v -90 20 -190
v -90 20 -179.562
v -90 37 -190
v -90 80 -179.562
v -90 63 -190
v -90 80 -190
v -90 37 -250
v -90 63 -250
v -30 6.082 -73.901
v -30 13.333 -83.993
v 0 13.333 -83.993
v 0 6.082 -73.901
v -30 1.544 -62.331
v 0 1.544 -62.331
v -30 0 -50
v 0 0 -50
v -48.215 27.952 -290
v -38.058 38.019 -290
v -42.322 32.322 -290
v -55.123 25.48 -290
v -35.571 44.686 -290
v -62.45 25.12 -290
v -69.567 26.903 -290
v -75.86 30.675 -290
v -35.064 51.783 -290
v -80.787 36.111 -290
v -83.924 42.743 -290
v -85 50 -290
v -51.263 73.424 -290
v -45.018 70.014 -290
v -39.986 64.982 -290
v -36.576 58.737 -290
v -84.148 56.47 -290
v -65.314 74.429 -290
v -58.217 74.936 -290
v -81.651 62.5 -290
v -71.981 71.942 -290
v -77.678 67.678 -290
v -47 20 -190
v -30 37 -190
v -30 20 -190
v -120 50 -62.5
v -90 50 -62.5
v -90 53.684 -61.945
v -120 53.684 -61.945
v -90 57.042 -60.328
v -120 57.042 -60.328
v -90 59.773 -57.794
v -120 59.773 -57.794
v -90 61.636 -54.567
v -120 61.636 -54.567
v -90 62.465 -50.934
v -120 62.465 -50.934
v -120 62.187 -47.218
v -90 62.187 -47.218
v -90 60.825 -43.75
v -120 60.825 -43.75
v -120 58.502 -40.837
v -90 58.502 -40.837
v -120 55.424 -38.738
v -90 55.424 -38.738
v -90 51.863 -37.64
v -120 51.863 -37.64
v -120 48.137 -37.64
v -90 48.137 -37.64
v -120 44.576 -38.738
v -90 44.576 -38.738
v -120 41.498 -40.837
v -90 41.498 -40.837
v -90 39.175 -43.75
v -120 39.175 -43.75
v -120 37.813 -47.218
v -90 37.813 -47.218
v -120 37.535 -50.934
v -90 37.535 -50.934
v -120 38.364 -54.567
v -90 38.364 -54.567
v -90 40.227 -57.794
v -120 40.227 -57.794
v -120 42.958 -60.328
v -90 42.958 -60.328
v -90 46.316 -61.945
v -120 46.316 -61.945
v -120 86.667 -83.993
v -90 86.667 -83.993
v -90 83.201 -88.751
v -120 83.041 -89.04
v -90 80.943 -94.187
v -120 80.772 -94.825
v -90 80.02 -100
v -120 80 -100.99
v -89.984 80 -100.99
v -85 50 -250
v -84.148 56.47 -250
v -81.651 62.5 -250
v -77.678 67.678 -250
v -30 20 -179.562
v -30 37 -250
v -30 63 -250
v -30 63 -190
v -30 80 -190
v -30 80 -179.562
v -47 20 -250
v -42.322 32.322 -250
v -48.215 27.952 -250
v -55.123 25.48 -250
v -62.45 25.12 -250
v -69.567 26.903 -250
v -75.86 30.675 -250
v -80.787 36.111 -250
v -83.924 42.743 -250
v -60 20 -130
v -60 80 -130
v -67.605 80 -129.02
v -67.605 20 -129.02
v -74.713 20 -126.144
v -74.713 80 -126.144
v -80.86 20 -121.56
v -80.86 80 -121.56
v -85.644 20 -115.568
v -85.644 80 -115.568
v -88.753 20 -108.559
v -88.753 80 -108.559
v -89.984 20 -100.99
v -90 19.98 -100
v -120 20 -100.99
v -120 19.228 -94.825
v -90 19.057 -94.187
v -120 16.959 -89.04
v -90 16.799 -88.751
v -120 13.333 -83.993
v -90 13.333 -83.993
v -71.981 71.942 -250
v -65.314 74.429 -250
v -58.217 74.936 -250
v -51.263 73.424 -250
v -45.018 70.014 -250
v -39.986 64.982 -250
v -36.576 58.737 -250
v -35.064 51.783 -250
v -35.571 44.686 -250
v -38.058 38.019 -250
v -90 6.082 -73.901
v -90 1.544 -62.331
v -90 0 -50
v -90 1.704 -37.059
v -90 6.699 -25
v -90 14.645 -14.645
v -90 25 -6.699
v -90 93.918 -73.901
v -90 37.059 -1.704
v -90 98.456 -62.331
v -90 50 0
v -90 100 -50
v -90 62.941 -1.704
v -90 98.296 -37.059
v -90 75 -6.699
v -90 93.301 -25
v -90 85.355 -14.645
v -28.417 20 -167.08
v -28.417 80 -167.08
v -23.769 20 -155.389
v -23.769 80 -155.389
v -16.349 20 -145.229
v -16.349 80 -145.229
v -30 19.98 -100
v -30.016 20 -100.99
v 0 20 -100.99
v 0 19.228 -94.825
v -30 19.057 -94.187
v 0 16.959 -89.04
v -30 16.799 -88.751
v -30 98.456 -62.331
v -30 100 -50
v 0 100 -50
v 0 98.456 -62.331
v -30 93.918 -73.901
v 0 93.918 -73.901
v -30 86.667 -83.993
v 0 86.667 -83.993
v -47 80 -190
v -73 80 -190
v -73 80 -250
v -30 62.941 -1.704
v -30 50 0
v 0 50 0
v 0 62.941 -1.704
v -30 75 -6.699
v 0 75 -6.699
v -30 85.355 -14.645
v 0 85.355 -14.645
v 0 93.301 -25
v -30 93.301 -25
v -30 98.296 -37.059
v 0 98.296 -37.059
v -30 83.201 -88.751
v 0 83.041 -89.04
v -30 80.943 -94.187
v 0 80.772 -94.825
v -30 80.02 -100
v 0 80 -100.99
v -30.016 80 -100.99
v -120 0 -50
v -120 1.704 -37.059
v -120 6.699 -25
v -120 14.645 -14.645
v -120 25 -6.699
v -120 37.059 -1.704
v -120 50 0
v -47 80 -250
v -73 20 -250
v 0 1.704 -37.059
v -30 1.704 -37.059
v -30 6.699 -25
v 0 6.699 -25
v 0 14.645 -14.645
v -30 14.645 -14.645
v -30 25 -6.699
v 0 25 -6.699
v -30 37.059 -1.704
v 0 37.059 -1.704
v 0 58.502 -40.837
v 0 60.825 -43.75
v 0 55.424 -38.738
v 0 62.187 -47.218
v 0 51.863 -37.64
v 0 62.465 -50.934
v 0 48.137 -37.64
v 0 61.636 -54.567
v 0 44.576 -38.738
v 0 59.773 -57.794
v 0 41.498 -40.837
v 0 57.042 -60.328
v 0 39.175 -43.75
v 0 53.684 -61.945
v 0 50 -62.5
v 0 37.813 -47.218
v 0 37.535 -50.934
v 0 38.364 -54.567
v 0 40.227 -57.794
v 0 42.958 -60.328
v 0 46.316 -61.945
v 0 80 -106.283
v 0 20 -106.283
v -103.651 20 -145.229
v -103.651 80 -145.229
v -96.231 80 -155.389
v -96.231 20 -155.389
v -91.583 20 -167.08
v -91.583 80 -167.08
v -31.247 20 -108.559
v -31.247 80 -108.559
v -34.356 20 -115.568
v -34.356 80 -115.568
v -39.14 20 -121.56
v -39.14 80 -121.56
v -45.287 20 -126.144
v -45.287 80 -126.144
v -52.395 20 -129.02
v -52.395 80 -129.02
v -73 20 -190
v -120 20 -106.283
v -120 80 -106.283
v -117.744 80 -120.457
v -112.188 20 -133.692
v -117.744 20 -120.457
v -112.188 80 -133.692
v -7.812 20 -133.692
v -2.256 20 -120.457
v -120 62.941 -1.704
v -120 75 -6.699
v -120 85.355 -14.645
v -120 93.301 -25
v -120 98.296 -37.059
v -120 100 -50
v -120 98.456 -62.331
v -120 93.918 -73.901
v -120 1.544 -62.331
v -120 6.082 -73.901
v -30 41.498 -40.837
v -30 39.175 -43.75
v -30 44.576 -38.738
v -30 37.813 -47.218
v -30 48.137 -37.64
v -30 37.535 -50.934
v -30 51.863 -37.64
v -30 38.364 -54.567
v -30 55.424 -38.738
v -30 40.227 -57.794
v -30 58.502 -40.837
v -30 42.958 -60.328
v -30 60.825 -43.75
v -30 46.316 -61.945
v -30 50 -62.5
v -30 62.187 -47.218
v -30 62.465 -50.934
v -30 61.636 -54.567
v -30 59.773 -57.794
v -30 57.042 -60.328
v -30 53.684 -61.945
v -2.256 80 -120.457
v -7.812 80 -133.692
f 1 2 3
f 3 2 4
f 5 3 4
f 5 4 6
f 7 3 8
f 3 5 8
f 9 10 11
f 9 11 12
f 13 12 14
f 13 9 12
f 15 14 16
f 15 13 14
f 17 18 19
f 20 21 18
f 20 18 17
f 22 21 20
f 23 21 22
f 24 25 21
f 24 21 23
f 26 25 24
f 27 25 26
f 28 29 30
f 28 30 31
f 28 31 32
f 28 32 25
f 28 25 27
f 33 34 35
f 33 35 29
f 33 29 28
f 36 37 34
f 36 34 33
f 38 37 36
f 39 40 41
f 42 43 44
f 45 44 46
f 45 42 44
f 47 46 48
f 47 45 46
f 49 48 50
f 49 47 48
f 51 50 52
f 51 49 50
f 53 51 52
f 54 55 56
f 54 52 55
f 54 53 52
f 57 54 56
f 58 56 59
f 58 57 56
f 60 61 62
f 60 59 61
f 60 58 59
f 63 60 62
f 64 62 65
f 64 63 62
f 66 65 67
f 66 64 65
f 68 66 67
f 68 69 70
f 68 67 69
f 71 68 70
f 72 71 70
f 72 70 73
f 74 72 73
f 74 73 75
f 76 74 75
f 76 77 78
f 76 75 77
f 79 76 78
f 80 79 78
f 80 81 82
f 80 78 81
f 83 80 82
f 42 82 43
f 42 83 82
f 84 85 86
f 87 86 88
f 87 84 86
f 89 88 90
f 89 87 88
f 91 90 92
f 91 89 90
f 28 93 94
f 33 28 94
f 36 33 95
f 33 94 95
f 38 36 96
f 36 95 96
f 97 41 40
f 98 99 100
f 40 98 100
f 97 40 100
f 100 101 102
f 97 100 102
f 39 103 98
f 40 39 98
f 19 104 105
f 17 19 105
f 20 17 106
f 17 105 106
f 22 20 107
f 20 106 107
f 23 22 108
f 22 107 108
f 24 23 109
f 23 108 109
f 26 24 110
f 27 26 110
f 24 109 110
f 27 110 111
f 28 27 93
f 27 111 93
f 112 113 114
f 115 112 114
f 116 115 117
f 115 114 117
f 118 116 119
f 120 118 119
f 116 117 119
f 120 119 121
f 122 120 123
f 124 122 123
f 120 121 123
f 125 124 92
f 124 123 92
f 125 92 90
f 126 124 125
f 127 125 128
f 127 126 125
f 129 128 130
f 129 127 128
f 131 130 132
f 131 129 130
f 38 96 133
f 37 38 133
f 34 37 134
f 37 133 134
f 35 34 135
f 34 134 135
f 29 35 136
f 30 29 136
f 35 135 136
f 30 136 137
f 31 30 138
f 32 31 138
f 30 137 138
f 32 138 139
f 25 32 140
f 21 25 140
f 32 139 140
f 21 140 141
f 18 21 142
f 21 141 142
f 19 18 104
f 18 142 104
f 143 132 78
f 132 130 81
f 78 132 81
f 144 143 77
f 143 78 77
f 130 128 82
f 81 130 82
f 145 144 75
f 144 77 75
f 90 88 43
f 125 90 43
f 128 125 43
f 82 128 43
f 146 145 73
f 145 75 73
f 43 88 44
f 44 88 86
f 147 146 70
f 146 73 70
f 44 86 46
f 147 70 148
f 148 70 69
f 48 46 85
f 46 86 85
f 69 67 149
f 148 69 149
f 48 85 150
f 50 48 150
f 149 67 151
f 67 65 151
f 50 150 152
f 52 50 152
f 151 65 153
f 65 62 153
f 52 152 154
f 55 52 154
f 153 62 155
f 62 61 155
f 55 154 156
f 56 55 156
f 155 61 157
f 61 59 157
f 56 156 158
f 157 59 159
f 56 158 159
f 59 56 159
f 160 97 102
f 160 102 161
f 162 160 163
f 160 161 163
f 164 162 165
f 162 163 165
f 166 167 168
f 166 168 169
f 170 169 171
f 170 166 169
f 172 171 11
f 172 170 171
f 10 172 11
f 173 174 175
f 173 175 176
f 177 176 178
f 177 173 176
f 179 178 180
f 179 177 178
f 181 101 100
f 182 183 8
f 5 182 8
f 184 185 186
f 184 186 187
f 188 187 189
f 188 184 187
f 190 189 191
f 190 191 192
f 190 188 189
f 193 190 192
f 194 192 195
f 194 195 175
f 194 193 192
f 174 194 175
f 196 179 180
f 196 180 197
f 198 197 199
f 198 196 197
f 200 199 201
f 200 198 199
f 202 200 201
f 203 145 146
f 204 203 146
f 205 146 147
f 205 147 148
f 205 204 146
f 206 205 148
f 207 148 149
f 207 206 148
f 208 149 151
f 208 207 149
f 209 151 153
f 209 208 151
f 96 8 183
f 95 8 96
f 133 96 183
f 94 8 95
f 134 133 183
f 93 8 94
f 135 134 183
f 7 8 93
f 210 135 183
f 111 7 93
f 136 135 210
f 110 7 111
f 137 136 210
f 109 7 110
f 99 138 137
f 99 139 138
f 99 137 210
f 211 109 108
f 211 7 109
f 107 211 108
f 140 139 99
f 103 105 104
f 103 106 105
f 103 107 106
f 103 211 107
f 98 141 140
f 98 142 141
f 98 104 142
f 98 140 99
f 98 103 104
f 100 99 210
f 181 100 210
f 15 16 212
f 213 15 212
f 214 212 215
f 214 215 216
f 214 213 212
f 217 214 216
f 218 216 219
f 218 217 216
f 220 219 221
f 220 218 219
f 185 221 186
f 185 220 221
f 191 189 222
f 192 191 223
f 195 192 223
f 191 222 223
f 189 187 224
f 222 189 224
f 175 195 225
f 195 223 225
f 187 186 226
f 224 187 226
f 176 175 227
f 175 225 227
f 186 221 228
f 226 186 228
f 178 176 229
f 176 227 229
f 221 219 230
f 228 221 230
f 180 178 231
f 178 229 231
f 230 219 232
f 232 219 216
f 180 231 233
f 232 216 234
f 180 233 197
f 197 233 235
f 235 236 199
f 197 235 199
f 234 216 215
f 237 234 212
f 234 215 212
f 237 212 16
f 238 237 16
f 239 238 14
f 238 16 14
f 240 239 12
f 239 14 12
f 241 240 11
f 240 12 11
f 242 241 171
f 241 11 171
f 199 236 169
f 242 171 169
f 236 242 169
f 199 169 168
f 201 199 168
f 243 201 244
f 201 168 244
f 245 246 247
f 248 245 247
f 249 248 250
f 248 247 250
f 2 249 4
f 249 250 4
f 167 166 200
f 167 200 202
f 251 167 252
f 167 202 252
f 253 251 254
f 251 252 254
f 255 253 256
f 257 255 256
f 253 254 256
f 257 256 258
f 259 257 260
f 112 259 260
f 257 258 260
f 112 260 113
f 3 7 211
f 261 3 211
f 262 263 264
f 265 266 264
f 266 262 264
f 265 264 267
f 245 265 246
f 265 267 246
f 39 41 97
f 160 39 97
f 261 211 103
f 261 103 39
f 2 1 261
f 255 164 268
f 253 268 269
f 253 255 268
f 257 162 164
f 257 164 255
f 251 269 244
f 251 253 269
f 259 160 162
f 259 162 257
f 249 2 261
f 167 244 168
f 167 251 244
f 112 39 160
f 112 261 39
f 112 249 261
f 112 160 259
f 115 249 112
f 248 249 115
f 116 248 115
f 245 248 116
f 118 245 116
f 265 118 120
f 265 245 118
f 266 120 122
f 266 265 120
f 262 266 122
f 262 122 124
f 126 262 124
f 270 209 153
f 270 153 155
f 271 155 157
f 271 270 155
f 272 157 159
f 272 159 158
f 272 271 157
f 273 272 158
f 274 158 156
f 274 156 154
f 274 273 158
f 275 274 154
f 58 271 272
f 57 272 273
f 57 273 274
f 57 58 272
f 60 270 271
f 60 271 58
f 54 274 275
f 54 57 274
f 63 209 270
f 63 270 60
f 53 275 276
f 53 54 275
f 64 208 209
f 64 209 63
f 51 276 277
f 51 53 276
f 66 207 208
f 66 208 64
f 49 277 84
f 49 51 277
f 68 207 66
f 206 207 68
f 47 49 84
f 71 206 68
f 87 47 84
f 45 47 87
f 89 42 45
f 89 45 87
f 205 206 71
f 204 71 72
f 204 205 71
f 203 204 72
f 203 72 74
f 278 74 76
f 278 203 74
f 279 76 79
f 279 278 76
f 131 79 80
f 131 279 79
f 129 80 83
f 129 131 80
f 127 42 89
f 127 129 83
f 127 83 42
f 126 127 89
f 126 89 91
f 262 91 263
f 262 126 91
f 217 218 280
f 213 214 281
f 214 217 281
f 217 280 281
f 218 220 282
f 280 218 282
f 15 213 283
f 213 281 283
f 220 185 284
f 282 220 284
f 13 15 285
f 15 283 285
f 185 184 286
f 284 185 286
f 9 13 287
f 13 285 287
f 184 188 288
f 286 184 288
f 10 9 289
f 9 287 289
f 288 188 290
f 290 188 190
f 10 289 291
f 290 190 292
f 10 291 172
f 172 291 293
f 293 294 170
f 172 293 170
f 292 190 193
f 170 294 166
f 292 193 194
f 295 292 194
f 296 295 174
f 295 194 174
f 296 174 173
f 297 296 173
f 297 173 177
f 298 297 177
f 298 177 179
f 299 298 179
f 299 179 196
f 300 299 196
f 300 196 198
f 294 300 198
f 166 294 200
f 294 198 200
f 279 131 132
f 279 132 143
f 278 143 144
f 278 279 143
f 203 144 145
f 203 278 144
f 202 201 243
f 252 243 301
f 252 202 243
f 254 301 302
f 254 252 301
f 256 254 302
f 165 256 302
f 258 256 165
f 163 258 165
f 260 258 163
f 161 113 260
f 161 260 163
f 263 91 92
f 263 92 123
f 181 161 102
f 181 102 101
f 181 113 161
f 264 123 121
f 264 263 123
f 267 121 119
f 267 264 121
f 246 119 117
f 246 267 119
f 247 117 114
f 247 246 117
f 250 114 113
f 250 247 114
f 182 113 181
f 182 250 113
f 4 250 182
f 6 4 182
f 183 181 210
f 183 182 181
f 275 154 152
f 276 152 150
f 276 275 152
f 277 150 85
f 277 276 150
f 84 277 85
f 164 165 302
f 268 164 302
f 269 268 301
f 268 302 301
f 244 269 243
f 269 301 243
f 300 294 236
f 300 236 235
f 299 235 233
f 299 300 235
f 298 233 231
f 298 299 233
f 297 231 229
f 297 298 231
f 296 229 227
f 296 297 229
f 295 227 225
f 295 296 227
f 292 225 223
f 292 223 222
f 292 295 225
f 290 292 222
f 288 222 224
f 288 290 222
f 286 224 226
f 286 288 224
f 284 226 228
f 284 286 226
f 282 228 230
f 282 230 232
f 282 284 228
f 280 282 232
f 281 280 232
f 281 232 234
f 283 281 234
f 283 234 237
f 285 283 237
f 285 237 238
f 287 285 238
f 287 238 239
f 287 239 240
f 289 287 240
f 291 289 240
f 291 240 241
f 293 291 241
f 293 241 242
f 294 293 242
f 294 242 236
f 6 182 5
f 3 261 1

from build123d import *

# Parameters (mm, degrees)
SKETCH1_W           = 120
SKETCH1_H           = 250
BOSS_EXTRUDE2_DEPTH = 100
CUT_EXTRUDE1_DEPTH  = 295.78805946
SKETCH5_R           = 12.5
CUT_EXTRUDE3_DEPTH  = 295.78805946
CUT_EXTRUDE4_DEPTH  = 60
SKETCH6_3_R         = 25
BOSS_EXTRUDE3_DEPTH = 40


with BuildPart() as part:
    # Sketch1 → Boss-Extrude2 (new body)
    with BuildSketch(Plane(origin=(0, 0, 0), x_dir=(1, 0, 0), z_dir=(0, 1, 0))):
        with Locations((-60, 125)):
            Rectangle(SKETCH1_W, SKETCH1_H)
    extrude(amount=BOSS_EXTRUDE2_DEPTH)

    # Sketch4 → Cut-Extrude1 (cut, through all)
    with BuildSketch(Plane(origin=(0, 100, 0), x_dir=(1, 0, 0), z_dir=(0, 1, 0))):
        with BuildLine():
            ThreePointArc((-30, 100), (-60, 130), (-90, 100))
            Line((-90, 100), (-90, 0))
            Line((-90, 0), (-30, 0))
            Line((-30, 0), (-30, 100))
        make_face()
        with BuildLine():
            Line((0, 250), (-30, 250))
            Line((-30, 250), (-30, 179.561593793))
            ThreePointArc((-30, 179.561593793), (-26.46215881, 161.088158847), (-16.349288051, 145.228967063))
            ThreePointArc((-16.349288051, 145.228967063), (-4.636985506, 127.241105931), (0, 106.283063455))
            Line((0, 106.283063455), (0, 250))
        make_face()
        with BuildLine():
            Line((-90, 179.561593793), (-90, 250))
            Line((-90, 250), (-120, 250))
            Line((-120, 250), (-120, 106.283063455))
            ThreePointArc((-120, 106.283063455), (-115.363014494, 127.241105931), (-103.650711949, 145.228967063))
            ThreePointArc((-103.650711949, 145.228967063), (-93.53784119, 161.088158847), (-90, 179.561593793))
        make_face()
    extrude(amount=-CUT_EXTRUDE1_DEPTH, mode=Mode.SUBTRACT)

    # Sketch5 → Cut-Extrude3 (cut, through all)
    with BuildSketch(Plane(origin=(0, 0, 0), x_dir=(0, 0, -1), z_dir=(1, 0, 0))):
        with BuildLine():
            Line((50, 100), (0, 100))
            Line((0, 100), (0, 50))
            ThreePointArc((0, 50), (14.644660941, 85.355339059), (50, 100))
        make_face()
        with BuildLine():
            ThreePointArc((50, 100), (68.257418584, 96.547466813), (83.993463424, 86.666666667))
            ThreePointArc((83.993463424, 86.666666667), (91.861485844, 81.726266594), (100.990195136, 80))
            Line((100.990195136, 80), (250, 80))
            Line((250, 80), (250, 100))
            Line((250, 100), (50, 100))
        make_face()
        with BuildLine():
            ThreePointArc((50.000000014, 0), (14.644660946, 14.644660936), (0, 50))
            Line((0, 50), (0, 0))
            Line((0, 0), (50.000000014, 0))
        make_face()
        with BuildLine():
            ThreePointArc((83.993463424, 13.333333333), (68.25741859, 3.45253319), (50.000000014, 0))
            Line((50.000000014, 0), (250, 0))
            Line((250, 0), (250, 20))
            Line((250, 20), (100.990195136, 20))
            ThreePointArc((100.990195136, 20), (91.861485844, 18.273733406), (83.993463424, 13.333333333))
        make_face()
        with Locations((50, 50)):
            Circle(SKETCH5_R)
    extrude(amount=-CUT_EXTRUDE3_DEPTH, mode=Mode.SUBTRACT)

    # Sketch6 → Cut-Extrude4 (cut)
    with BuildSketch(Plane(origin=(0, 0, -250), x_dir=(-1, 0, 0), z_dir=(0, 0, -1))):
        Polygon((90, 63), (90, 80), (73, 80), align=None)
        Polygon((90, 20), (90, 37), (73, 20), align=None)
        Polygon((30, 63), (47, 80), (30, 80), align=None)
        Polygon((47, 20), (30, 37), (30, 20), align=None)
    extrude(amount=-CUT_EXTRUDE4_DEPTH, mode=Mode.SUBTRACT)

    # Sketch6<3> → Boss-Extrude3 (add)
    with BuildSketch(Plane(origin=(0, 0, -250), x_dir=(-1, 0, 0), z_dir=(0, 0, -1))):
        with Locations((60, 50)):
            Circle(SKETCH6_3_R)
    extrude(amount=BOSS_EXTRUDE3_DEPTH)


solid = part.part
